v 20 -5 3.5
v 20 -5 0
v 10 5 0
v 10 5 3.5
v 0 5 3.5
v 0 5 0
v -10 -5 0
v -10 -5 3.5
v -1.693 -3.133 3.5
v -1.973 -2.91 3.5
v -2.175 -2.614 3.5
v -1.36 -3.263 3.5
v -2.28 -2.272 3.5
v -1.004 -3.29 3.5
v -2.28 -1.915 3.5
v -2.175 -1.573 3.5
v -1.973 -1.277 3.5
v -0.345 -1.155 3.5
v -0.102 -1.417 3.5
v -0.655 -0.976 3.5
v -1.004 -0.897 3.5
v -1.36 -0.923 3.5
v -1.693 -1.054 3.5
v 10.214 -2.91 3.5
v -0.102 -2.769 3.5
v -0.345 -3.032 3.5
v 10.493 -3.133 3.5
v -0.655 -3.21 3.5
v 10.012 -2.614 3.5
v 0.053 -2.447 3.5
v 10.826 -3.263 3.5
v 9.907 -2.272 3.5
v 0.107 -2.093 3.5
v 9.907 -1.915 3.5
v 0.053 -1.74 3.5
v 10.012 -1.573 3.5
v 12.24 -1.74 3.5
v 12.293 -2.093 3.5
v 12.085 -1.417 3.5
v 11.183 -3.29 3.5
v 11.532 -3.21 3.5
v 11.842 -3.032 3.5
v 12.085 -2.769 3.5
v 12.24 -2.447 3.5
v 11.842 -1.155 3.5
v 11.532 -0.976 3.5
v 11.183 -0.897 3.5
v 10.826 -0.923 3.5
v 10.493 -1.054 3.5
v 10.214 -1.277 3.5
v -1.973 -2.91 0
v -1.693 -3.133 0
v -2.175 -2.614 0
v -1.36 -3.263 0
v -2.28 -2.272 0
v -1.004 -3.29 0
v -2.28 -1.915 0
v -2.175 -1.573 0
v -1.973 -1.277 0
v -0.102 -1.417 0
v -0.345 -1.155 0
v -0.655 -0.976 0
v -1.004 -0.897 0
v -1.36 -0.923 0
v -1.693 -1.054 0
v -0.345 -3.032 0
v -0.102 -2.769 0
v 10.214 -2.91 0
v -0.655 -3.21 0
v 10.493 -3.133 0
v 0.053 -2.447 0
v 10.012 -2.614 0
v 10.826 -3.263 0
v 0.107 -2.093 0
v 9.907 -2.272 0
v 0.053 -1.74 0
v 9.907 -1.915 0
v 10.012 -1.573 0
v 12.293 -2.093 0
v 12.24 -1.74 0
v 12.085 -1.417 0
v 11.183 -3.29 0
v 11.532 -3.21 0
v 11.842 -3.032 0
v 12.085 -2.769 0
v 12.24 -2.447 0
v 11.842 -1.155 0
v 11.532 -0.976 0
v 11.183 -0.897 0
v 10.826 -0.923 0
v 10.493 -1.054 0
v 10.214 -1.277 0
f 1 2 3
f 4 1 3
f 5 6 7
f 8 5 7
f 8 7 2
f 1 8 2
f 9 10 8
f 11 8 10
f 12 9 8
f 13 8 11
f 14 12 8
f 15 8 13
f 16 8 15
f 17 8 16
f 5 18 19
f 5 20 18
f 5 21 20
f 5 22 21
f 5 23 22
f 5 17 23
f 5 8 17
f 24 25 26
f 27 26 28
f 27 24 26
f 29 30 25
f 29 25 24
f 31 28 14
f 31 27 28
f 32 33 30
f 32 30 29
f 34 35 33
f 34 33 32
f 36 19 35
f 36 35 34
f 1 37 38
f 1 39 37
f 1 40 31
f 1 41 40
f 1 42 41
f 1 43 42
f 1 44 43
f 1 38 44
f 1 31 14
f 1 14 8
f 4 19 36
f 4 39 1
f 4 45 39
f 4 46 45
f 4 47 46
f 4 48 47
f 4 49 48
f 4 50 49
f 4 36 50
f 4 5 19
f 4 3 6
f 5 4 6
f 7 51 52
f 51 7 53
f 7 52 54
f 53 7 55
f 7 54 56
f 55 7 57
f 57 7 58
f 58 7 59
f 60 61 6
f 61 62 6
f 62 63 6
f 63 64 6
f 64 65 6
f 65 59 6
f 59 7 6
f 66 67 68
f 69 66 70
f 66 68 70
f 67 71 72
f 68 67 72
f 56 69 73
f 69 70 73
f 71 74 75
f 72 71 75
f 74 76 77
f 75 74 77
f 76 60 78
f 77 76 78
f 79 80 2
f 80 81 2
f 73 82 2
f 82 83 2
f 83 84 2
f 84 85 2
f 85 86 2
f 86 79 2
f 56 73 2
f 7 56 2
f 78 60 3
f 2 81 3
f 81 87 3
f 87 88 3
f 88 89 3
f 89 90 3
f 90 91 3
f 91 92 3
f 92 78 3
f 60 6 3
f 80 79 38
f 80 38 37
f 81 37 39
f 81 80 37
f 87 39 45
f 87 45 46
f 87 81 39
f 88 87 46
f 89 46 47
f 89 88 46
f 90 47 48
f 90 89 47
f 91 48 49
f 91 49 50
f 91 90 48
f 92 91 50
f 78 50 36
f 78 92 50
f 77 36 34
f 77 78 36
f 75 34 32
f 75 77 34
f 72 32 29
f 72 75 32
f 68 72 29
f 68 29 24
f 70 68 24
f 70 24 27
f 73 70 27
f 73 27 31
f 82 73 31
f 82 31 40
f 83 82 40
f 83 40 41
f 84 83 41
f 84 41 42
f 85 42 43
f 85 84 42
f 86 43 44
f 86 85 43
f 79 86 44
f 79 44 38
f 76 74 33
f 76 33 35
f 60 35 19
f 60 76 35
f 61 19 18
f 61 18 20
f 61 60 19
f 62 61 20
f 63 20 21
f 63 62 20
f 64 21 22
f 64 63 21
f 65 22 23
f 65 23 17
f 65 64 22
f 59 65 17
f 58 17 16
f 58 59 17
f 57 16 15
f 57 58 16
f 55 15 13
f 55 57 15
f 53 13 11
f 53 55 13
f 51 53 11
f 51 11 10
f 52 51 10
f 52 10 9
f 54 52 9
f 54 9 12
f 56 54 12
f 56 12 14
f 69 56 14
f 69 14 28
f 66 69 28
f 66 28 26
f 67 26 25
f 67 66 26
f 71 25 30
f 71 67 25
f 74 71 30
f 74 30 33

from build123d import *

# Parameters (mm, degrees)
F0_R     = 1.2
F1_DEPTH = 3.5


with BuildPart() as f1:
    # F0 (on Top) → F1 (new body)
    with BuildSketch(Plane.XY):
        Polygon((20, -5), (10, 5), (0, 5), (-10, -5), align=None)
        with Locations((-1.093396, -2.093396)):
            Circle(F0_R, mode=Mode.SUBTRACT)
        with Locations((11.093396, -2.093396)):
            Circle(F0_R, mode=Mode.SUBTRACT)
    extrude(amount=F1_DEPTH)


with BuildPart() as f2_1:
    # F2: copy of F1
    add(f1.part)


solid = f2_1.part
